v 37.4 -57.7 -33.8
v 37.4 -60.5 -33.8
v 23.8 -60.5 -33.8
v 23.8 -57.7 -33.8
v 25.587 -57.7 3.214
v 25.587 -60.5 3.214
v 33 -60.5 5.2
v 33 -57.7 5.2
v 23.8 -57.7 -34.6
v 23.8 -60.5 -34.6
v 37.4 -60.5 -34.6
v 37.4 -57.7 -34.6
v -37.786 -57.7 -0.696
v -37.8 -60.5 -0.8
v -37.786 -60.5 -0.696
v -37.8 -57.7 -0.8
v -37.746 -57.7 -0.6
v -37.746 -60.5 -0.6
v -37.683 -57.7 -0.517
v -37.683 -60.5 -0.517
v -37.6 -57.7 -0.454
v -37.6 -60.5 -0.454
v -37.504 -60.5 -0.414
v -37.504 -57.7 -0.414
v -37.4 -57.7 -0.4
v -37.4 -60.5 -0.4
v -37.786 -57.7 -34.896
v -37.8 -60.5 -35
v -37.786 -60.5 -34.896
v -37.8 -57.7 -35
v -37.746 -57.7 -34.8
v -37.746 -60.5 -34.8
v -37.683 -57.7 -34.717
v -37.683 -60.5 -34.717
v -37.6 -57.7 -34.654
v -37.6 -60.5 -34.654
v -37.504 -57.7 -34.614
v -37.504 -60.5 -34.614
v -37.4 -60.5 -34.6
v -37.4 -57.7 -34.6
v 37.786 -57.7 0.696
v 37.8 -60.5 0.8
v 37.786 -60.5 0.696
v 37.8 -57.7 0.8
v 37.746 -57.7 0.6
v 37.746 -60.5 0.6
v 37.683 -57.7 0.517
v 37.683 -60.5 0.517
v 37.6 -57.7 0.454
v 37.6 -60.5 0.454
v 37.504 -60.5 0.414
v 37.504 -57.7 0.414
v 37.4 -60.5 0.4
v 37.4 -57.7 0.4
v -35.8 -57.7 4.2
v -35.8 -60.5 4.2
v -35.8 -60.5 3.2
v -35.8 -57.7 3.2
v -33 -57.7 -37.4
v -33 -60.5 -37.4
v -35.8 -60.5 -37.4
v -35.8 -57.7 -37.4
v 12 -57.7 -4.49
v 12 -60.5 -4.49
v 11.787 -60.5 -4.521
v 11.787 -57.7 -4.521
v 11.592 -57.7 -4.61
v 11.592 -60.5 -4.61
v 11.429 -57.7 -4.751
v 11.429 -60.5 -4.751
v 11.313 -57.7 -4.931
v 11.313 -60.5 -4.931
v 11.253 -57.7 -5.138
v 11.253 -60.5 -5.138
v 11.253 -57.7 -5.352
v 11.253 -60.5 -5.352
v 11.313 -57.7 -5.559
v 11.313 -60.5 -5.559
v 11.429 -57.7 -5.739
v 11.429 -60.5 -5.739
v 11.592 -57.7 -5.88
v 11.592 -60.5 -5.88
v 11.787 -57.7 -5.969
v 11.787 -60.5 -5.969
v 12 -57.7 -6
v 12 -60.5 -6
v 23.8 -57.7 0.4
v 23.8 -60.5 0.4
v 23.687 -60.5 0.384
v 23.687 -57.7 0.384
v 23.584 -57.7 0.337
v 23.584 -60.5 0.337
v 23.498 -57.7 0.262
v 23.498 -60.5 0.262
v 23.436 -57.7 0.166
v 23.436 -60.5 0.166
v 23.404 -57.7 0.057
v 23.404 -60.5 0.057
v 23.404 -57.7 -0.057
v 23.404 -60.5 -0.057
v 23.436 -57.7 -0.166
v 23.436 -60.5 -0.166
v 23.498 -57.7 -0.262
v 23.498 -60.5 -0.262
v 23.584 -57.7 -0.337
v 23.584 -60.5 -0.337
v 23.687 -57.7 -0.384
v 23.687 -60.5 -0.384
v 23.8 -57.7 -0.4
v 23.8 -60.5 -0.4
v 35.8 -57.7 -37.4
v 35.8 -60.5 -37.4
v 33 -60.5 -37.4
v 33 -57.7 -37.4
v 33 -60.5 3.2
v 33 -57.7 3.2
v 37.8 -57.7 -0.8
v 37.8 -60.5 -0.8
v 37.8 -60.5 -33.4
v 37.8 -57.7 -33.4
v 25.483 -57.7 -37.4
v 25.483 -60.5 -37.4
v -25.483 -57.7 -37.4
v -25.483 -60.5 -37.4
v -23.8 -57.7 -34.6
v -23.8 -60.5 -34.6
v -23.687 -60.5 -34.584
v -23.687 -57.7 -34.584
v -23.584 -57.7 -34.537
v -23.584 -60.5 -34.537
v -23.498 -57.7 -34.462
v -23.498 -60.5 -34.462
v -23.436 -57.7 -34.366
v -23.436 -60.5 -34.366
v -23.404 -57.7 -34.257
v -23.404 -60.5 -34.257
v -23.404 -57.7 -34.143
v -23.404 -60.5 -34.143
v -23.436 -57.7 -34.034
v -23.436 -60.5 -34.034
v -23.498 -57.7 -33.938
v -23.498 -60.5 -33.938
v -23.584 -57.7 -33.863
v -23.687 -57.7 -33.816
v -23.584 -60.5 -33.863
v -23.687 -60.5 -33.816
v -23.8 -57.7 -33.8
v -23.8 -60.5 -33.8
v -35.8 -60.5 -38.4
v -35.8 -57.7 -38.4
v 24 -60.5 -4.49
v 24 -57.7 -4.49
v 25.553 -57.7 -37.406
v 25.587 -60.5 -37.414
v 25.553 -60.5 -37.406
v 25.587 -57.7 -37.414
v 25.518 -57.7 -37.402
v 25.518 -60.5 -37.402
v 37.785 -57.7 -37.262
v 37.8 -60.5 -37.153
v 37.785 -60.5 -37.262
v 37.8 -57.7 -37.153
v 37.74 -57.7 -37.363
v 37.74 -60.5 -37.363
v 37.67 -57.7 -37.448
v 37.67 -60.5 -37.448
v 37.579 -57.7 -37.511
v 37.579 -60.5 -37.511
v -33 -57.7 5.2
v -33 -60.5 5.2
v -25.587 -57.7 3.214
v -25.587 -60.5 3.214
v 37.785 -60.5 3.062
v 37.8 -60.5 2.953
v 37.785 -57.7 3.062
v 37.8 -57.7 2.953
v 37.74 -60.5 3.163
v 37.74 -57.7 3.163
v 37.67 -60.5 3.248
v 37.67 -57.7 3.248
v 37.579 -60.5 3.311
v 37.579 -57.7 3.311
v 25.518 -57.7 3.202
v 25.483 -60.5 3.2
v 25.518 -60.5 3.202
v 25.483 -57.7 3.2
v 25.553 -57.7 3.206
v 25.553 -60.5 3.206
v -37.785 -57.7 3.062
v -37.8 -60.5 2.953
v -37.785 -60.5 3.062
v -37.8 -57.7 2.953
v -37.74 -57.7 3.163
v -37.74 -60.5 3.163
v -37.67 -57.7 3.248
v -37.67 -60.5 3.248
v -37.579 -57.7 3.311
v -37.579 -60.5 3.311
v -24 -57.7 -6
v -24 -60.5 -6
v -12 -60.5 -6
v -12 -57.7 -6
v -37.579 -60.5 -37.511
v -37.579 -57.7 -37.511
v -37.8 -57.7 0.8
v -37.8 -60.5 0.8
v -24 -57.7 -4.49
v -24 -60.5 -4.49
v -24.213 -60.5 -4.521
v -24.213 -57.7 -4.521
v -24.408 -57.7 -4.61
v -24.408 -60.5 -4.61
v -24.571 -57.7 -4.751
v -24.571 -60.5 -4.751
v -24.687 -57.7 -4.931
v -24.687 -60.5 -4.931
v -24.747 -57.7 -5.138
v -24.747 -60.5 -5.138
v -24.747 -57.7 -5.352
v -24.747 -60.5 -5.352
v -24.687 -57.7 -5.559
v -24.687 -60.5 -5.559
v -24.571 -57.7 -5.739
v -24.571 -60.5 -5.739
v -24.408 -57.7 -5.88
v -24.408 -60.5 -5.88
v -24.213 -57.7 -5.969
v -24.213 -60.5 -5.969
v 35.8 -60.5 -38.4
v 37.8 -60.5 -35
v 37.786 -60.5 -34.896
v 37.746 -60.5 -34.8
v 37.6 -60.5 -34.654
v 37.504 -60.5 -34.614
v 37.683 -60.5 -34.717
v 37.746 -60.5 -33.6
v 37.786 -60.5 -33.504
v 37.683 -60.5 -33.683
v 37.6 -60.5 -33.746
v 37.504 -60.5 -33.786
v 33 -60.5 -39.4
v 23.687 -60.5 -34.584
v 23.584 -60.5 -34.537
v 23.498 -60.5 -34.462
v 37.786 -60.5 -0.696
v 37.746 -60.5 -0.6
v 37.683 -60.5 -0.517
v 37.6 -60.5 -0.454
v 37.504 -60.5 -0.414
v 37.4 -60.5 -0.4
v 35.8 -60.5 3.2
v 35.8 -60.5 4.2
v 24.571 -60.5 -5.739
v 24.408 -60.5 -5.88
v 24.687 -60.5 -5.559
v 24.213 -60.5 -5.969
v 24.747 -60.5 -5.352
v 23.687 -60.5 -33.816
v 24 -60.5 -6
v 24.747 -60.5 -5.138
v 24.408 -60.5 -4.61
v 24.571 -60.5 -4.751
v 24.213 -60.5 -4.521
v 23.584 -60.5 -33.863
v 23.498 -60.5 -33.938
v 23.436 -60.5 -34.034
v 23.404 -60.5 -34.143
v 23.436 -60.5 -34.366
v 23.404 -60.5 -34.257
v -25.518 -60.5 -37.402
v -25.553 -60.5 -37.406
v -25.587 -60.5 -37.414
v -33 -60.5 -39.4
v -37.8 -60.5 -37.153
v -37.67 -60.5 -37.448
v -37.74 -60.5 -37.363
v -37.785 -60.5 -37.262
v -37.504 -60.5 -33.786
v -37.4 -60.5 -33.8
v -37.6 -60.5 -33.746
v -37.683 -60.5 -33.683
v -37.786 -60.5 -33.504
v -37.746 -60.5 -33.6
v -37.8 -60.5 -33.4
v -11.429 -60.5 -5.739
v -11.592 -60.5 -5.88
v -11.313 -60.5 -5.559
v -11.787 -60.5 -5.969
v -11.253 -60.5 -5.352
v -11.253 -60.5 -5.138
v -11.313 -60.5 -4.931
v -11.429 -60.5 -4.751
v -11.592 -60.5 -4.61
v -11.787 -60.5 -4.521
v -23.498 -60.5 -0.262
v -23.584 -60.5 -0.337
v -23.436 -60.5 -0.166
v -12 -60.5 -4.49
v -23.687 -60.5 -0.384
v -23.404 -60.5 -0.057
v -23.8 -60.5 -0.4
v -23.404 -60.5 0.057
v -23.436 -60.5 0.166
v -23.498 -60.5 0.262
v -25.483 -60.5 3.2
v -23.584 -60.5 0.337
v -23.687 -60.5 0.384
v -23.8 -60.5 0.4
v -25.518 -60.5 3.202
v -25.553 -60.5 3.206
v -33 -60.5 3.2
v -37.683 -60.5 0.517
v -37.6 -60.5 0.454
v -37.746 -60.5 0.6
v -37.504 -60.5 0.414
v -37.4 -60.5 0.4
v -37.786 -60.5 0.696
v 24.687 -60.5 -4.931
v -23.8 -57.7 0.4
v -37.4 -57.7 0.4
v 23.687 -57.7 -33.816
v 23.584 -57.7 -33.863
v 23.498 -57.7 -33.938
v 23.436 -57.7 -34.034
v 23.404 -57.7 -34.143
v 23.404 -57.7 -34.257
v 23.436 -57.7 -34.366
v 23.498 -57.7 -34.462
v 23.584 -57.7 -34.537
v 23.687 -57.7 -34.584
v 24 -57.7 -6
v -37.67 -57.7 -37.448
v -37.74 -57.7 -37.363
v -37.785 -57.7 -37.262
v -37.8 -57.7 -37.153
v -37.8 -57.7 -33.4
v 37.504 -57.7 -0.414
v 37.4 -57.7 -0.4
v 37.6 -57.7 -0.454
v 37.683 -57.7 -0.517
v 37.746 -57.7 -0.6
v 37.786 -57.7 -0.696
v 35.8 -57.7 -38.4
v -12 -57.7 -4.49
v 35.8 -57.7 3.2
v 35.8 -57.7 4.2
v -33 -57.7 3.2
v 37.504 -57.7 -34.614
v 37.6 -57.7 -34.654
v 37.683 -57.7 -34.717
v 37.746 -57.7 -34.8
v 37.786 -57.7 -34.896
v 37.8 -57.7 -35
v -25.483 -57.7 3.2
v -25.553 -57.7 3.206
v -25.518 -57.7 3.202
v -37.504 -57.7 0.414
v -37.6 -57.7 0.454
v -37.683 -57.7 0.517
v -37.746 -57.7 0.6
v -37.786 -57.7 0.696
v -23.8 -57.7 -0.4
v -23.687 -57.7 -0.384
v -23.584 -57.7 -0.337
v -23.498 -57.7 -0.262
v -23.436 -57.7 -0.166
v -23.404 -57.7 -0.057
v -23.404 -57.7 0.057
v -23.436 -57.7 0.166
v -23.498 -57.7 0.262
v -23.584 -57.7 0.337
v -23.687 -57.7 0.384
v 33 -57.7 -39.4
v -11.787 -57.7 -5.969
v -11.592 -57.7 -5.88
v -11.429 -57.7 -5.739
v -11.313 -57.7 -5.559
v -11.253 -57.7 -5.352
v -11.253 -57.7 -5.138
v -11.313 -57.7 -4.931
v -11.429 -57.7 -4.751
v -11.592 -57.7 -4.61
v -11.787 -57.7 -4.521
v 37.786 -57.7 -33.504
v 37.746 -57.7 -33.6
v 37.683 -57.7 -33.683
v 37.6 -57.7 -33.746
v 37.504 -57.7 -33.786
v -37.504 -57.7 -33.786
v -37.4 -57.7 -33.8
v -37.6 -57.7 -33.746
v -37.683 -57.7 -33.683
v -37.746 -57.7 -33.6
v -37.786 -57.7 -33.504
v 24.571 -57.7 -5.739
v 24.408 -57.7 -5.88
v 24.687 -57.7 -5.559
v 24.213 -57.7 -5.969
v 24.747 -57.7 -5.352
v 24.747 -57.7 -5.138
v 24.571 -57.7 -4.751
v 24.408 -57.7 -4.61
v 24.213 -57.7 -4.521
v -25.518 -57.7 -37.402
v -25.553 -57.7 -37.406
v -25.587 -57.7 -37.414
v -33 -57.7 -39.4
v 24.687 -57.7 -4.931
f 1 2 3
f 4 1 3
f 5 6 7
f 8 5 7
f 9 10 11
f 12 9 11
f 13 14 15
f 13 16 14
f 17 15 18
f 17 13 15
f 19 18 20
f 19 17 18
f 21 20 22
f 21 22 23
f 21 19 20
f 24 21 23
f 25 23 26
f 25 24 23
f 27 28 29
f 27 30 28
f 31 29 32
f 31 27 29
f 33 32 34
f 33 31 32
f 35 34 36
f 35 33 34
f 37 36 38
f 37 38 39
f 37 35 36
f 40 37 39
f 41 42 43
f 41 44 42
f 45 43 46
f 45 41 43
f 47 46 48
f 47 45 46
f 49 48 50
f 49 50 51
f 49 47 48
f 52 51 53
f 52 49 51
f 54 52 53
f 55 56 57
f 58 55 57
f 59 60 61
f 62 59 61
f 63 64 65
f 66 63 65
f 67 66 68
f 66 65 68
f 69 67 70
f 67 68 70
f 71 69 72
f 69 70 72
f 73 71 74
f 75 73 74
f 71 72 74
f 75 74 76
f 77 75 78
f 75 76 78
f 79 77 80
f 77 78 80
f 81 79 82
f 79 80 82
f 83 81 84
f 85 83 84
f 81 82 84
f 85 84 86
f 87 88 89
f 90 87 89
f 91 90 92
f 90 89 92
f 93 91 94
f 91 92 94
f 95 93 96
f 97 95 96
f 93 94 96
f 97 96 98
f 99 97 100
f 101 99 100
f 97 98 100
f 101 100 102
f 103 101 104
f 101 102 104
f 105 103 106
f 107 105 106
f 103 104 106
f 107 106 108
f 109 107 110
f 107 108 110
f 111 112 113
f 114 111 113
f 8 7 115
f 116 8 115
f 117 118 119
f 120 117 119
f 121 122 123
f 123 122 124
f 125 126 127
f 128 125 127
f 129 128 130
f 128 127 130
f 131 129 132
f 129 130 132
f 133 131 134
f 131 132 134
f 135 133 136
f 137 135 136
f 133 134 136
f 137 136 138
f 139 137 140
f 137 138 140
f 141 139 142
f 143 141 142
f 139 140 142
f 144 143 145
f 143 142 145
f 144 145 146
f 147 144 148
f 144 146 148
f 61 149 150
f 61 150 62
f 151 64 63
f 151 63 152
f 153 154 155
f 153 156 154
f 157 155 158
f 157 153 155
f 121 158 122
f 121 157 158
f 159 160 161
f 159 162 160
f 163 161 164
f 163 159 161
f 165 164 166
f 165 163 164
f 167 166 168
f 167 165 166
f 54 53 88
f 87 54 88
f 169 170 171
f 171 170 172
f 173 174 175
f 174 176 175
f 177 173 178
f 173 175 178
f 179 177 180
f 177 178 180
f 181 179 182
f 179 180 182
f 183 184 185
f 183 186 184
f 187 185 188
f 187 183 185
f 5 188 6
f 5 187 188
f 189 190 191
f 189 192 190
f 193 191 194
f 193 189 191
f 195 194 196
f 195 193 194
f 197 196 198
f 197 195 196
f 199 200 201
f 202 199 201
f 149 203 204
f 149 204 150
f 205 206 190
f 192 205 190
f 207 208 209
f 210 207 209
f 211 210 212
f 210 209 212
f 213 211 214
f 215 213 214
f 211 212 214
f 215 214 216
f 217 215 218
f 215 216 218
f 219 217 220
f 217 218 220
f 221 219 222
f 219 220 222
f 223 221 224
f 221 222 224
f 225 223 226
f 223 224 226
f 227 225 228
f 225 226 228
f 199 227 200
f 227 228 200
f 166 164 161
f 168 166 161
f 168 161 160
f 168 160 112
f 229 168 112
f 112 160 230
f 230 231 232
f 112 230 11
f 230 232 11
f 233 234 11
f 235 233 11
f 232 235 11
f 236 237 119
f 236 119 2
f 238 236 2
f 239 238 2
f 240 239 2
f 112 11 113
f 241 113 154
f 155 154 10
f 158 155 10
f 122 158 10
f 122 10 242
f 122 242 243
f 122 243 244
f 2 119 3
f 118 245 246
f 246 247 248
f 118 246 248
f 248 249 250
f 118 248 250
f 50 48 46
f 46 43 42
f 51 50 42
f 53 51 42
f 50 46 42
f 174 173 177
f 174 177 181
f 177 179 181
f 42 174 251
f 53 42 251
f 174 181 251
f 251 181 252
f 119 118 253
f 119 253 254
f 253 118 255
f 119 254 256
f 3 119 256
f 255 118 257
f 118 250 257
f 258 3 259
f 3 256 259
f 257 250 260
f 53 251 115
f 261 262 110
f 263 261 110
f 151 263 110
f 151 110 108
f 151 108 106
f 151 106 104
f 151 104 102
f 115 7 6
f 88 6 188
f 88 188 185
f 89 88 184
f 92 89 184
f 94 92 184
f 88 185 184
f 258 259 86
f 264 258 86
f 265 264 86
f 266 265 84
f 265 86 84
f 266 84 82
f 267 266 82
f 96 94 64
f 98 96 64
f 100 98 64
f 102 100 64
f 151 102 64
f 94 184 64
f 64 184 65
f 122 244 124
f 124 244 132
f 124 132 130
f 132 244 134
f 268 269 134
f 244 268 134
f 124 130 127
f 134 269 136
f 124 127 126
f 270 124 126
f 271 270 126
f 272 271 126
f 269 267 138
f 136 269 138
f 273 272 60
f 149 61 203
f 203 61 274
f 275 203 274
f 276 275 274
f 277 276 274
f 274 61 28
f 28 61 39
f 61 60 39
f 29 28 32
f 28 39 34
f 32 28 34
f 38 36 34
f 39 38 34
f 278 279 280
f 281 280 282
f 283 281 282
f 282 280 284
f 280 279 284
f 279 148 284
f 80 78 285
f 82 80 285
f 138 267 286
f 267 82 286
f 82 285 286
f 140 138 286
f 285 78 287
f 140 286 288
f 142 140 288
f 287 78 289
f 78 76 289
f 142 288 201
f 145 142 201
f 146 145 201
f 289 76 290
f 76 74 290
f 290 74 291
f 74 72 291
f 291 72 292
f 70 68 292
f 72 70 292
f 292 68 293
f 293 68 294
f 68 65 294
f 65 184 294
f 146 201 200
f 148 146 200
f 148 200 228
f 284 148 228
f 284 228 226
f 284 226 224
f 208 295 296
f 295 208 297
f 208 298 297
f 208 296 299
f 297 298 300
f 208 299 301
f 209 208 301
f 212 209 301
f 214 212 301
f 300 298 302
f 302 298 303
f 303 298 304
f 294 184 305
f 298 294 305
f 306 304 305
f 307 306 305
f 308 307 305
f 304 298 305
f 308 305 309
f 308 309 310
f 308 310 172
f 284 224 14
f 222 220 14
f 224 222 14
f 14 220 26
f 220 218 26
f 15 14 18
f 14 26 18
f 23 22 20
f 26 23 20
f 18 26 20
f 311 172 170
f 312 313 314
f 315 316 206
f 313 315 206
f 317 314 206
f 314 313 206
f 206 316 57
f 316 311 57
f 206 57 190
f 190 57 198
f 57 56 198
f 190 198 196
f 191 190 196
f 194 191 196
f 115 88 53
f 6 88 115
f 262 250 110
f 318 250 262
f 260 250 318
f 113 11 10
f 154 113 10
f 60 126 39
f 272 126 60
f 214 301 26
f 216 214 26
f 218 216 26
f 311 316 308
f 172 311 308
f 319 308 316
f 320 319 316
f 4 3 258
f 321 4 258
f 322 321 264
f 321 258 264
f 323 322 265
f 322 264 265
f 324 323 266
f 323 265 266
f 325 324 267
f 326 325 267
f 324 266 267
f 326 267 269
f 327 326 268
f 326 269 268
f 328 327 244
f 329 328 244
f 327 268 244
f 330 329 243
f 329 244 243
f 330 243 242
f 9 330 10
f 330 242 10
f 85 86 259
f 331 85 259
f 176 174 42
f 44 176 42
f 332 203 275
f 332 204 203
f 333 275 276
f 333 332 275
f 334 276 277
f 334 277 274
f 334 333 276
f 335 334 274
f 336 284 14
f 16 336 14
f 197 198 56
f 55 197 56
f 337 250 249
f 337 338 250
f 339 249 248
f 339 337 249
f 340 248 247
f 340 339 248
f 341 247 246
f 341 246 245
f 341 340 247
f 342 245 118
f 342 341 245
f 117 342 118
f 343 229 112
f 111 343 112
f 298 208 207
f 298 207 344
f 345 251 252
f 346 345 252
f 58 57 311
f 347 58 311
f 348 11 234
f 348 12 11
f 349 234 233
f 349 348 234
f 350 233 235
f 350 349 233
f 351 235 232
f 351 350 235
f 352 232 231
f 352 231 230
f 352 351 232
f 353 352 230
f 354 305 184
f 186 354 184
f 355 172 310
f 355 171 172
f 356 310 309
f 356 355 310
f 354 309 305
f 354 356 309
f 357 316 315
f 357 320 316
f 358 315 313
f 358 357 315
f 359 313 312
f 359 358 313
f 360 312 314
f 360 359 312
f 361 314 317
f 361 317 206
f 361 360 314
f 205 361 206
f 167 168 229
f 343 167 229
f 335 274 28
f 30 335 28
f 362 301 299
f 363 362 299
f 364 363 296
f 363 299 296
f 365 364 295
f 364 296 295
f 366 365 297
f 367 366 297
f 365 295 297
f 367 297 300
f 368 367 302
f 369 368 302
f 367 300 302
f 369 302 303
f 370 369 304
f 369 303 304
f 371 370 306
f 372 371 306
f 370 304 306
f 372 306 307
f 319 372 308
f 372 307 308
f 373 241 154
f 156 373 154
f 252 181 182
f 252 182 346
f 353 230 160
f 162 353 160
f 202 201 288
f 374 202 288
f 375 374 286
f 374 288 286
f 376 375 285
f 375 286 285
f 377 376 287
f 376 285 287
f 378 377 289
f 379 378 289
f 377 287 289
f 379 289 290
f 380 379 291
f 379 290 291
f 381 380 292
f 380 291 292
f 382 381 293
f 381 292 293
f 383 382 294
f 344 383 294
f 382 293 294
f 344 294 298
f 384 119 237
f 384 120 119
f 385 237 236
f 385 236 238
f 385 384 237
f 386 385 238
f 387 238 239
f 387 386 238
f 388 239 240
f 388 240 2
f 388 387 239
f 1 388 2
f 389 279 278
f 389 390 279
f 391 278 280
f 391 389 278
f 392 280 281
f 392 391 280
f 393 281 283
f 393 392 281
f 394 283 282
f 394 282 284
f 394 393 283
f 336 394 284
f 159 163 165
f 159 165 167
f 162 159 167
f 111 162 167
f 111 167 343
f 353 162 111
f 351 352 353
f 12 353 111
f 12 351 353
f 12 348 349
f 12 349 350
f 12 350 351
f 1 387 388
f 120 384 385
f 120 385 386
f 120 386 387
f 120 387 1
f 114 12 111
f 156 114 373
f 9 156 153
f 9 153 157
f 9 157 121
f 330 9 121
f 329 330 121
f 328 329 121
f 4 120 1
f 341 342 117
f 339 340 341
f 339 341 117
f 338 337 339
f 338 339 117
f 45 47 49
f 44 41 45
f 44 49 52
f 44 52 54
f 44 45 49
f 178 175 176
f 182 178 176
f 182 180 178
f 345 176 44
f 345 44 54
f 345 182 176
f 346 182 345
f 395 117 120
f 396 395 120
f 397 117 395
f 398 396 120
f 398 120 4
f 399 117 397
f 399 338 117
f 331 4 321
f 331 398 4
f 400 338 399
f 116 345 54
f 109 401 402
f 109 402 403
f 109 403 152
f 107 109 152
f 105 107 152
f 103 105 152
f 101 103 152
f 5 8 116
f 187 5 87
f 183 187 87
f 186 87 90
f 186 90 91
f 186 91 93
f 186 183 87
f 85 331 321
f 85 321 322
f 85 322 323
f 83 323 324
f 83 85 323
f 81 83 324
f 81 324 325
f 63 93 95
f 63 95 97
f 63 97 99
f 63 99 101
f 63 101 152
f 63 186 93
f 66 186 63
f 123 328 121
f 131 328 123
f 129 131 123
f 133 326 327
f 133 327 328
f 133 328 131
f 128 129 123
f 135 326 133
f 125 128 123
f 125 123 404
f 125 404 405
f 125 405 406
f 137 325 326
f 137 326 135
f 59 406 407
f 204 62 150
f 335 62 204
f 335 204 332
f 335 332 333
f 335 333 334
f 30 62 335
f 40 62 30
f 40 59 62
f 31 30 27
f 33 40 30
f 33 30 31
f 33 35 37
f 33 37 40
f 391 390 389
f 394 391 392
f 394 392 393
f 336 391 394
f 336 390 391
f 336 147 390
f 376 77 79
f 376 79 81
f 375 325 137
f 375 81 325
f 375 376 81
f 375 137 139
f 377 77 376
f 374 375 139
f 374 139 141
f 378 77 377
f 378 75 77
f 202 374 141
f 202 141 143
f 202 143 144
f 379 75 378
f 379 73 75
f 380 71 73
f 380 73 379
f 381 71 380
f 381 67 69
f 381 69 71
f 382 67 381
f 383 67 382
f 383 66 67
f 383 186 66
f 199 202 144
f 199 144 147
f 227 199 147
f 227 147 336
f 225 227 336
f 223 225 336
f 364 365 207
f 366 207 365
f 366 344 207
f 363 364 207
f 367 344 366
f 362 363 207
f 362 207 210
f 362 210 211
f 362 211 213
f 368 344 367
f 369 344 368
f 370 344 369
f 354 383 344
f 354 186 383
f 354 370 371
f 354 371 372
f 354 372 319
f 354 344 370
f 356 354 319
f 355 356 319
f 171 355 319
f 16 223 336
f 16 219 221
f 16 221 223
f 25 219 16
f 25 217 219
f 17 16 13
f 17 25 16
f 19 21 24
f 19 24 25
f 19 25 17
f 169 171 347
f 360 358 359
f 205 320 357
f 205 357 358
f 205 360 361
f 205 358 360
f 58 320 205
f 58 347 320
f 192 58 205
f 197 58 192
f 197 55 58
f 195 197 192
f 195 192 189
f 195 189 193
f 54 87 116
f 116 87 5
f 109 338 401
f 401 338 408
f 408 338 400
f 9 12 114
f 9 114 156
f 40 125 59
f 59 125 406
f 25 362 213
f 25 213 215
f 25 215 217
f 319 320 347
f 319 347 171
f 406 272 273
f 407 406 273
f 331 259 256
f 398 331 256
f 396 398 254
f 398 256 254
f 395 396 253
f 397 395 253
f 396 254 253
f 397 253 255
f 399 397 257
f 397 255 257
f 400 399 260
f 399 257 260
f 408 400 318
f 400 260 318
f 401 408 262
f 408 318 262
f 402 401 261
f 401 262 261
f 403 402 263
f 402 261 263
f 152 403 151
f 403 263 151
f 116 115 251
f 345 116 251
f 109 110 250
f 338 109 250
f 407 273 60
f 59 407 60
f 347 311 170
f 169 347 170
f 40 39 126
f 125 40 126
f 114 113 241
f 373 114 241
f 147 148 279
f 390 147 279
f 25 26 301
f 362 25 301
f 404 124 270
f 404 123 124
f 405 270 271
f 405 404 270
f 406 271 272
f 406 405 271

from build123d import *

# Parameters (mm, degrees)
PAD009_DEPTH    = 2.8
FILLET004_R     = 0.4
POCKET014_DEPTH = 2.801


with BuildPart() as part:
    # Sketch009 → Pad009 (new body)
    with BuildSketch(Plane.XZ.offset(60.5)):
        with BuildLine():
            Line((37.8, 3.2), (37.8, 0.4))
            Line((37.8, 0.4), (23.8, 0.4))
            ThreePointArc((23.8, 0.4), (23.4, 0), (23.8, -0.4))
            Line((23.8, -0.4), (37.8, -0.4))
            Line((37.8, -0.4), (37.8, -33.8))
            Line((37.8, -33.8), (23.8, -33.8))
            ThreePointArc((23.8, -33.8), (23.4, -34.2), (23.8, -34.6))
            Line((23.8, -34.6), (37.8, -34.6))
            Line((37.8, -34.6), (37.8, -37.4))
            Line((37.8, -37.4), (35.8, -38.4))
            Line((35.8, -38.4), (35.8, -37.4))
            Line((35.8, -37.4), (33, -37.4))
            Line((33, -37.4), (33, -39.4))
            Line((33, -39.4), (25.535898, -37.4))
            Line((25.535898, -37.4), (-25.535898, -37.4))
            Line((-25.535898, -37.4), (-33, -39.4))
            Line((-33, -39.4), (-33, -37.4))
            Line((-33, -37.4), (-35.8, -37.4))
            Line((-35.8, -38.4), (-35.8, -37.4))
            Line((-37.8, -37.4), (-35.8, -38.4))
            Line((-37.8, -37.4), (-37.8, -34.6))
            Line((-37.8, -34.6), (-23.8, -34.6))
            ThreePointArc((-23.8, -34.6), (-23.4, -34.2), (-23.8, -33.8))
            Line((-23.8, -33.8), (-37.8, -33.8))
            Line((-37.8, -33.8), (-37.8, -0.4))
            Line((-37.8, -0.4), (-23.8, -0.4))
            ThreePointArc((-23.8, -0.4), (-23.4, 0), (-23.8, 0.4))
            Line((-23.8, 0.4), (-37.8, 0.4))
            Line((-37.8, 0.4), (-37.8, 3.2))
            Line((-37.8, 3.2), (-35.8, 4.2))
            Line((-35.8, 4.2), (-35.8, 3.2))
            Line((-35.8, 3.2), (-33, 3.2))
            Line((-33, 3.2), (-33, 5.2))
            Line((-33, 5.2), (-25.535898, 3.2))
            Line((-25.535898, 3.2), (25.535898, 3.2))
            Line((25.535898, 3.2), (33, 5.2))
            Line((33, 5.2), (33, 3.2))
            Line((33, 3.2), (35.8, 3.2))
            Line((35.8, 3.2), (35.8, 4.2))
            Line((37.8, 3.2), (35.8, 4.2))
        make_face()
    extrude(amount=-PAD009_DEPTH)

    # Fillet004
    fillet004_edges = [part.edges().sort_by_distance(p)[0] for p in [
        (37.8, -59.1, -0.4),
        (37.8, -59.1, 0.4),
        (37.8, -59.1, 3.2),
        (25.535898, -59.1, 3.2),
        (-25.535898, -59.1, 3.2),
        (-37.8, -59.1, 3.2),
        (-37.8, -59.1, 0.4),
        (-37.8, -59.1, -0.4),
        (-37.8, -59.1, -33.8),
        (-37.8, -59.1, -34.6),
        (-37.8, -59.1, -37.4),
        (-25.535898, -59.1, -37.4),
        (25.535898, -59.1, -37.4),
        (37.8, -59.1, -37.4),
        (37.8, -59.1, -34.6),
        (37.8, -59.1, -33.8),
    ]]
    fillet(fillet004_edges, radius=FILLET004_R)

    # Sketch025 → Pocket014 (cut, through all)
    with BuildSketch(Plane.XZ.offset(60.5)):
        with BuildLine():
            ThreePointArc((-24, -4.49), (-24.755, -5.245), (-24, -6))
            Line((-24, -6), (-12, -6))
            ThreePointArc((-12, -6), (-11.245, -5.245), (-12, -4.49))
            Line((-24, -4.49), (-12, -4.49))
        make_face()
        with BuildLine():
            ThreePointArc((12, -4.49), (11.245, -5.245), (12, -6))
            Line((12, -6), (24, -6))
            ThreePointArc((24, -6), (24.755, -5.245), (24, -4.49))
            Line((12, -4.49), (24, -4.49))
        make_face()
    extrude(amount=-POCKET014_DEPTH, mode=Mode.SUBTRACT)


solid = part.part
